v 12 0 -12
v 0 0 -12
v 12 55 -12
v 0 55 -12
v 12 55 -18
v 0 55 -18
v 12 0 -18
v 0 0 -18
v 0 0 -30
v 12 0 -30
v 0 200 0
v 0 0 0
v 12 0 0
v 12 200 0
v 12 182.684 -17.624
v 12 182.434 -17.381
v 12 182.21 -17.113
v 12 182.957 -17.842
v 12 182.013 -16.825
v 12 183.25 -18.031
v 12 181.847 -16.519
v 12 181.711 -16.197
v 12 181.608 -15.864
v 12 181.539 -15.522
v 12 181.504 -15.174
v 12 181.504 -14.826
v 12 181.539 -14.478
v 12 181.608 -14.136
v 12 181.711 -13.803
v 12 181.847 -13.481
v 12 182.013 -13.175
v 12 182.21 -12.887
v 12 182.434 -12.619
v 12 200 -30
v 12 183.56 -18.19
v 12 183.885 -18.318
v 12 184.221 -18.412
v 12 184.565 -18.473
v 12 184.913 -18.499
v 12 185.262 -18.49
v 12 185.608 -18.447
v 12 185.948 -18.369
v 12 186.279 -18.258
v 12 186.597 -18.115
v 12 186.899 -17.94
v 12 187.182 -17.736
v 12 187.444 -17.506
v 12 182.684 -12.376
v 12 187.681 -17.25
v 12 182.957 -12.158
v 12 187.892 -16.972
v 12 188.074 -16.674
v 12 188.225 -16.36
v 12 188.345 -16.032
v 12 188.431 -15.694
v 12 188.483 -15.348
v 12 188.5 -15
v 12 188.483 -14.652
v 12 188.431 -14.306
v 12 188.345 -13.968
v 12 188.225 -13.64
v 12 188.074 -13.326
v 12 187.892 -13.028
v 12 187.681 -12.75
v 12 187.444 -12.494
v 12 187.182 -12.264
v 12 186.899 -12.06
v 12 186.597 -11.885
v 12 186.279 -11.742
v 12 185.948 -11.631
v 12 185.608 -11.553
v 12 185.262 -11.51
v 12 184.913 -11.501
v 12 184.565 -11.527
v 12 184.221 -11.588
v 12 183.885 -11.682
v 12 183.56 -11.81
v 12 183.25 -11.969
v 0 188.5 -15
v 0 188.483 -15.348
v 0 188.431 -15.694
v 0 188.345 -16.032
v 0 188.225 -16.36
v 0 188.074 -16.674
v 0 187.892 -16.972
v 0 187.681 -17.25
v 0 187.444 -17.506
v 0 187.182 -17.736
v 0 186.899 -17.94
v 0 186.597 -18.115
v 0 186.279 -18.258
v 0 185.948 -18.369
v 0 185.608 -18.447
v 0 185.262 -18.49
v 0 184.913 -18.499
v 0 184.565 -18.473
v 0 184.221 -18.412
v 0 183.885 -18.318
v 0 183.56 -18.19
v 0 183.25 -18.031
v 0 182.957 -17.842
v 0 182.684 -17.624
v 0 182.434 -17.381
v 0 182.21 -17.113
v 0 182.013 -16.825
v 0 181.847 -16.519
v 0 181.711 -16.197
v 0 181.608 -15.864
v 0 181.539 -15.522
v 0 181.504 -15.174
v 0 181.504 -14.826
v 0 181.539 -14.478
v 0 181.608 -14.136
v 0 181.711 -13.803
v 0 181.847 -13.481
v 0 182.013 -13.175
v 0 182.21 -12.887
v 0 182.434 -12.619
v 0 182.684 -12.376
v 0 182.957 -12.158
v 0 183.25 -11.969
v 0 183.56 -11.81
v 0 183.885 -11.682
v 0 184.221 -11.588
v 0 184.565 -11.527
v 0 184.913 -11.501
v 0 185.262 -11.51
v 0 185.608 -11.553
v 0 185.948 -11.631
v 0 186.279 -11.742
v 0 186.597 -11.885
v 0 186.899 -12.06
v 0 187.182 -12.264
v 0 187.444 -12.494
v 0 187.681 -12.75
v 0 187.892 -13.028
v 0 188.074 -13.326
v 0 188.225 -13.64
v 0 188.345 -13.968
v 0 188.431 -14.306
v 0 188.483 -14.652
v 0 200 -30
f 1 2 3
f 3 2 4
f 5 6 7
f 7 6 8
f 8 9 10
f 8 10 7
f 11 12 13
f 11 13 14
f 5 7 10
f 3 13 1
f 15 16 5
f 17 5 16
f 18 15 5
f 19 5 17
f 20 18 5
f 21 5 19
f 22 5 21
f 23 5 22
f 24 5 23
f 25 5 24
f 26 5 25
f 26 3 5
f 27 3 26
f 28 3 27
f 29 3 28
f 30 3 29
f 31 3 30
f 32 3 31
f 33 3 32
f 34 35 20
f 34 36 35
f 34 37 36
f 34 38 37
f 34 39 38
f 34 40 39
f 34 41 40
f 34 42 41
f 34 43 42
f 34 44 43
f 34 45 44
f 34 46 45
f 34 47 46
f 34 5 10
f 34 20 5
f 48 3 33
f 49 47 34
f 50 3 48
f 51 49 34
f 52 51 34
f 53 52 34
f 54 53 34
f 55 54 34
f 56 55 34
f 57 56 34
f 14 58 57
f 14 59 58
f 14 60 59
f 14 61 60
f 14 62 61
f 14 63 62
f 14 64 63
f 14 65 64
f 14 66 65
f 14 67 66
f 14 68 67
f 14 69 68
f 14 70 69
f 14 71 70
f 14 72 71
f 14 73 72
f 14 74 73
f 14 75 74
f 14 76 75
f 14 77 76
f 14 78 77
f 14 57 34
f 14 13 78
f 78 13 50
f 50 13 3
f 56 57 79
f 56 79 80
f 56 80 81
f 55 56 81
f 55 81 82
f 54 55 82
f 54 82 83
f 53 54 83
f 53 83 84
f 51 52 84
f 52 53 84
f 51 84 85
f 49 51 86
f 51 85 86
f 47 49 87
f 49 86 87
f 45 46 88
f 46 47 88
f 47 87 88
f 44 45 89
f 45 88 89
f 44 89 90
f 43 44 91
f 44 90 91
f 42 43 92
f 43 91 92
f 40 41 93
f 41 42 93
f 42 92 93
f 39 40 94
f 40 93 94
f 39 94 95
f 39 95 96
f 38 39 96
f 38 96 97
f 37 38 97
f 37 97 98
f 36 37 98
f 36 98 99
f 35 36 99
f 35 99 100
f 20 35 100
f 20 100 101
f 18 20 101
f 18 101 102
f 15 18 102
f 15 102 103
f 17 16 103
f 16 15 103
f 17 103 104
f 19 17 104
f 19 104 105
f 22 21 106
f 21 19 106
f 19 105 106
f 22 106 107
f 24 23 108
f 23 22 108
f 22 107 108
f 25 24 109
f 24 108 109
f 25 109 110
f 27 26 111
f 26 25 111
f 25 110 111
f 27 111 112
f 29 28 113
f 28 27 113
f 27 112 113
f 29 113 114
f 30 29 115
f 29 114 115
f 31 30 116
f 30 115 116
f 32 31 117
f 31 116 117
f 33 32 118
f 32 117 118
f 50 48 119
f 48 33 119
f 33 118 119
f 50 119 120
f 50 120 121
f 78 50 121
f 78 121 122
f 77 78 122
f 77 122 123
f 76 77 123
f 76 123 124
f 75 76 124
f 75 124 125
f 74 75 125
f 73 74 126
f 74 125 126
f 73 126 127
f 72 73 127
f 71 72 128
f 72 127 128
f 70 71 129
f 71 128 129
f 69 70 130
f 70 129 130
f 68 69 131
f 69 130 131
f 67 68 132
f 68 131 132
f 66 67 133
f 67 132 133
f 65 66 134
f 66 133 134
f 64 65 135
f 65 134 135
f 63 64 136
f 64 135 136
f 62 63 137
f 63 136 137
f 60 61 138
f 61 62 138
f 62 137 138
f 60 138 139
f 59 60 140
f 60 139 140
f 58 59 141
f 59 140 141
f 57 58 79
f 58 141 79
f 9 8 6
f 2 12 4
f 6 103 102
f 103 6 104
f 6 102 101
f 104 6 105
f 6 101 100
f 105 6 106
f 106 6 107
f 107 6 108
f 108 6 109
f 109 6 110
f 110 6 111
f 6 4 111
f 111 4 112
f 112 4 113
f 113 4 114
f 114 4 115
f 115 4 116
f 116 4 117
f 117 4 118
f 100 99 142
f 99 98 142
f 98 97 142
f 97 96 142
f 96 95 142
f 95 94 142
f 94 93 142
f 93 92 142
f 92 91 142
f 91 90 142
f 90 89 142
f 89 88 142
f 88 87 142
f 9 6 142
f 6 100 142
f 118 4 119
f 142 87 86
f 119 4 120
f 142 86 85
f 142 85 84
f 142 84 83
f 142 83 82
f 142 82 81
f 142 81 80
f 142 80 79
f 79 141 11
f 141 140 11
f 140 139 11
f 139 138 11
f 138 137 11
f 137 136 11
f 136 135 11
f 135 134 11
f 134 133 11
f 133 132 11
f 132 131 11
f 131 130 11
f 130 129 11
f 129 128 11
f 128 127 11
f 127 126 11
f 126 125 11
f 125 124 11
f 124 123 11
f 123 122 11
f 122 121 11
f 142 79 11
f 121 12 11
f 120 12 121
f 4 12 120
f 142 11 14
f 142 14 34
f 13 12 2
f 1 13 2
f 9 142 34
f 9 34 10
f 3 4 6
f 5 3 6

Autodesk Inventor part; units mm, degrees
ref_plane "YZ Plane" through (0, 0, 0) normal (1, 0, 0) x (0, 1, 0)
ref_plane "XZ Plane" through (0, 0, 0) normal (0, 1, 0) x (-1, 0, 0)
ref_plane "XY Plane" through (0, 0, 0) normal (0, 0, 1) x (1, 0, 0)
sketch "Boceto2" plane through (0, 0, 0) normal (1, 0, 0) x (0, 1, 0)
  line L0 (0, 0) -> (200, 0)
  line L1 (200, 0) -> (200, -30)
  line L2 (200, -30) -> (0, -30)
  circle A0 centre (185, -15) radius 3.5
  line L3 (0, -12) -> (55, -12)
  line L4 (55, -12) -> (55, -18)
  line L5 (55, -18) -> (0, -18)
  line L6 (0, 0) -> (0, -12)
  line L7 (0, -30) -> (0, -18)
  point P0 (200, -15)
  dimension "d2" = 7
  dimension "d3" = 15
  dimension "d7" = 6
  dimension "d8" = 30
  dimension "d9" = 12
  dimension "d10" = 200
  dimension "d11" = 12
  dimension "d12" = 55
extrude "Extrusión1" add sketch "Boceto2" along normal blind 12
properties part number "ColumnaSoporte"
